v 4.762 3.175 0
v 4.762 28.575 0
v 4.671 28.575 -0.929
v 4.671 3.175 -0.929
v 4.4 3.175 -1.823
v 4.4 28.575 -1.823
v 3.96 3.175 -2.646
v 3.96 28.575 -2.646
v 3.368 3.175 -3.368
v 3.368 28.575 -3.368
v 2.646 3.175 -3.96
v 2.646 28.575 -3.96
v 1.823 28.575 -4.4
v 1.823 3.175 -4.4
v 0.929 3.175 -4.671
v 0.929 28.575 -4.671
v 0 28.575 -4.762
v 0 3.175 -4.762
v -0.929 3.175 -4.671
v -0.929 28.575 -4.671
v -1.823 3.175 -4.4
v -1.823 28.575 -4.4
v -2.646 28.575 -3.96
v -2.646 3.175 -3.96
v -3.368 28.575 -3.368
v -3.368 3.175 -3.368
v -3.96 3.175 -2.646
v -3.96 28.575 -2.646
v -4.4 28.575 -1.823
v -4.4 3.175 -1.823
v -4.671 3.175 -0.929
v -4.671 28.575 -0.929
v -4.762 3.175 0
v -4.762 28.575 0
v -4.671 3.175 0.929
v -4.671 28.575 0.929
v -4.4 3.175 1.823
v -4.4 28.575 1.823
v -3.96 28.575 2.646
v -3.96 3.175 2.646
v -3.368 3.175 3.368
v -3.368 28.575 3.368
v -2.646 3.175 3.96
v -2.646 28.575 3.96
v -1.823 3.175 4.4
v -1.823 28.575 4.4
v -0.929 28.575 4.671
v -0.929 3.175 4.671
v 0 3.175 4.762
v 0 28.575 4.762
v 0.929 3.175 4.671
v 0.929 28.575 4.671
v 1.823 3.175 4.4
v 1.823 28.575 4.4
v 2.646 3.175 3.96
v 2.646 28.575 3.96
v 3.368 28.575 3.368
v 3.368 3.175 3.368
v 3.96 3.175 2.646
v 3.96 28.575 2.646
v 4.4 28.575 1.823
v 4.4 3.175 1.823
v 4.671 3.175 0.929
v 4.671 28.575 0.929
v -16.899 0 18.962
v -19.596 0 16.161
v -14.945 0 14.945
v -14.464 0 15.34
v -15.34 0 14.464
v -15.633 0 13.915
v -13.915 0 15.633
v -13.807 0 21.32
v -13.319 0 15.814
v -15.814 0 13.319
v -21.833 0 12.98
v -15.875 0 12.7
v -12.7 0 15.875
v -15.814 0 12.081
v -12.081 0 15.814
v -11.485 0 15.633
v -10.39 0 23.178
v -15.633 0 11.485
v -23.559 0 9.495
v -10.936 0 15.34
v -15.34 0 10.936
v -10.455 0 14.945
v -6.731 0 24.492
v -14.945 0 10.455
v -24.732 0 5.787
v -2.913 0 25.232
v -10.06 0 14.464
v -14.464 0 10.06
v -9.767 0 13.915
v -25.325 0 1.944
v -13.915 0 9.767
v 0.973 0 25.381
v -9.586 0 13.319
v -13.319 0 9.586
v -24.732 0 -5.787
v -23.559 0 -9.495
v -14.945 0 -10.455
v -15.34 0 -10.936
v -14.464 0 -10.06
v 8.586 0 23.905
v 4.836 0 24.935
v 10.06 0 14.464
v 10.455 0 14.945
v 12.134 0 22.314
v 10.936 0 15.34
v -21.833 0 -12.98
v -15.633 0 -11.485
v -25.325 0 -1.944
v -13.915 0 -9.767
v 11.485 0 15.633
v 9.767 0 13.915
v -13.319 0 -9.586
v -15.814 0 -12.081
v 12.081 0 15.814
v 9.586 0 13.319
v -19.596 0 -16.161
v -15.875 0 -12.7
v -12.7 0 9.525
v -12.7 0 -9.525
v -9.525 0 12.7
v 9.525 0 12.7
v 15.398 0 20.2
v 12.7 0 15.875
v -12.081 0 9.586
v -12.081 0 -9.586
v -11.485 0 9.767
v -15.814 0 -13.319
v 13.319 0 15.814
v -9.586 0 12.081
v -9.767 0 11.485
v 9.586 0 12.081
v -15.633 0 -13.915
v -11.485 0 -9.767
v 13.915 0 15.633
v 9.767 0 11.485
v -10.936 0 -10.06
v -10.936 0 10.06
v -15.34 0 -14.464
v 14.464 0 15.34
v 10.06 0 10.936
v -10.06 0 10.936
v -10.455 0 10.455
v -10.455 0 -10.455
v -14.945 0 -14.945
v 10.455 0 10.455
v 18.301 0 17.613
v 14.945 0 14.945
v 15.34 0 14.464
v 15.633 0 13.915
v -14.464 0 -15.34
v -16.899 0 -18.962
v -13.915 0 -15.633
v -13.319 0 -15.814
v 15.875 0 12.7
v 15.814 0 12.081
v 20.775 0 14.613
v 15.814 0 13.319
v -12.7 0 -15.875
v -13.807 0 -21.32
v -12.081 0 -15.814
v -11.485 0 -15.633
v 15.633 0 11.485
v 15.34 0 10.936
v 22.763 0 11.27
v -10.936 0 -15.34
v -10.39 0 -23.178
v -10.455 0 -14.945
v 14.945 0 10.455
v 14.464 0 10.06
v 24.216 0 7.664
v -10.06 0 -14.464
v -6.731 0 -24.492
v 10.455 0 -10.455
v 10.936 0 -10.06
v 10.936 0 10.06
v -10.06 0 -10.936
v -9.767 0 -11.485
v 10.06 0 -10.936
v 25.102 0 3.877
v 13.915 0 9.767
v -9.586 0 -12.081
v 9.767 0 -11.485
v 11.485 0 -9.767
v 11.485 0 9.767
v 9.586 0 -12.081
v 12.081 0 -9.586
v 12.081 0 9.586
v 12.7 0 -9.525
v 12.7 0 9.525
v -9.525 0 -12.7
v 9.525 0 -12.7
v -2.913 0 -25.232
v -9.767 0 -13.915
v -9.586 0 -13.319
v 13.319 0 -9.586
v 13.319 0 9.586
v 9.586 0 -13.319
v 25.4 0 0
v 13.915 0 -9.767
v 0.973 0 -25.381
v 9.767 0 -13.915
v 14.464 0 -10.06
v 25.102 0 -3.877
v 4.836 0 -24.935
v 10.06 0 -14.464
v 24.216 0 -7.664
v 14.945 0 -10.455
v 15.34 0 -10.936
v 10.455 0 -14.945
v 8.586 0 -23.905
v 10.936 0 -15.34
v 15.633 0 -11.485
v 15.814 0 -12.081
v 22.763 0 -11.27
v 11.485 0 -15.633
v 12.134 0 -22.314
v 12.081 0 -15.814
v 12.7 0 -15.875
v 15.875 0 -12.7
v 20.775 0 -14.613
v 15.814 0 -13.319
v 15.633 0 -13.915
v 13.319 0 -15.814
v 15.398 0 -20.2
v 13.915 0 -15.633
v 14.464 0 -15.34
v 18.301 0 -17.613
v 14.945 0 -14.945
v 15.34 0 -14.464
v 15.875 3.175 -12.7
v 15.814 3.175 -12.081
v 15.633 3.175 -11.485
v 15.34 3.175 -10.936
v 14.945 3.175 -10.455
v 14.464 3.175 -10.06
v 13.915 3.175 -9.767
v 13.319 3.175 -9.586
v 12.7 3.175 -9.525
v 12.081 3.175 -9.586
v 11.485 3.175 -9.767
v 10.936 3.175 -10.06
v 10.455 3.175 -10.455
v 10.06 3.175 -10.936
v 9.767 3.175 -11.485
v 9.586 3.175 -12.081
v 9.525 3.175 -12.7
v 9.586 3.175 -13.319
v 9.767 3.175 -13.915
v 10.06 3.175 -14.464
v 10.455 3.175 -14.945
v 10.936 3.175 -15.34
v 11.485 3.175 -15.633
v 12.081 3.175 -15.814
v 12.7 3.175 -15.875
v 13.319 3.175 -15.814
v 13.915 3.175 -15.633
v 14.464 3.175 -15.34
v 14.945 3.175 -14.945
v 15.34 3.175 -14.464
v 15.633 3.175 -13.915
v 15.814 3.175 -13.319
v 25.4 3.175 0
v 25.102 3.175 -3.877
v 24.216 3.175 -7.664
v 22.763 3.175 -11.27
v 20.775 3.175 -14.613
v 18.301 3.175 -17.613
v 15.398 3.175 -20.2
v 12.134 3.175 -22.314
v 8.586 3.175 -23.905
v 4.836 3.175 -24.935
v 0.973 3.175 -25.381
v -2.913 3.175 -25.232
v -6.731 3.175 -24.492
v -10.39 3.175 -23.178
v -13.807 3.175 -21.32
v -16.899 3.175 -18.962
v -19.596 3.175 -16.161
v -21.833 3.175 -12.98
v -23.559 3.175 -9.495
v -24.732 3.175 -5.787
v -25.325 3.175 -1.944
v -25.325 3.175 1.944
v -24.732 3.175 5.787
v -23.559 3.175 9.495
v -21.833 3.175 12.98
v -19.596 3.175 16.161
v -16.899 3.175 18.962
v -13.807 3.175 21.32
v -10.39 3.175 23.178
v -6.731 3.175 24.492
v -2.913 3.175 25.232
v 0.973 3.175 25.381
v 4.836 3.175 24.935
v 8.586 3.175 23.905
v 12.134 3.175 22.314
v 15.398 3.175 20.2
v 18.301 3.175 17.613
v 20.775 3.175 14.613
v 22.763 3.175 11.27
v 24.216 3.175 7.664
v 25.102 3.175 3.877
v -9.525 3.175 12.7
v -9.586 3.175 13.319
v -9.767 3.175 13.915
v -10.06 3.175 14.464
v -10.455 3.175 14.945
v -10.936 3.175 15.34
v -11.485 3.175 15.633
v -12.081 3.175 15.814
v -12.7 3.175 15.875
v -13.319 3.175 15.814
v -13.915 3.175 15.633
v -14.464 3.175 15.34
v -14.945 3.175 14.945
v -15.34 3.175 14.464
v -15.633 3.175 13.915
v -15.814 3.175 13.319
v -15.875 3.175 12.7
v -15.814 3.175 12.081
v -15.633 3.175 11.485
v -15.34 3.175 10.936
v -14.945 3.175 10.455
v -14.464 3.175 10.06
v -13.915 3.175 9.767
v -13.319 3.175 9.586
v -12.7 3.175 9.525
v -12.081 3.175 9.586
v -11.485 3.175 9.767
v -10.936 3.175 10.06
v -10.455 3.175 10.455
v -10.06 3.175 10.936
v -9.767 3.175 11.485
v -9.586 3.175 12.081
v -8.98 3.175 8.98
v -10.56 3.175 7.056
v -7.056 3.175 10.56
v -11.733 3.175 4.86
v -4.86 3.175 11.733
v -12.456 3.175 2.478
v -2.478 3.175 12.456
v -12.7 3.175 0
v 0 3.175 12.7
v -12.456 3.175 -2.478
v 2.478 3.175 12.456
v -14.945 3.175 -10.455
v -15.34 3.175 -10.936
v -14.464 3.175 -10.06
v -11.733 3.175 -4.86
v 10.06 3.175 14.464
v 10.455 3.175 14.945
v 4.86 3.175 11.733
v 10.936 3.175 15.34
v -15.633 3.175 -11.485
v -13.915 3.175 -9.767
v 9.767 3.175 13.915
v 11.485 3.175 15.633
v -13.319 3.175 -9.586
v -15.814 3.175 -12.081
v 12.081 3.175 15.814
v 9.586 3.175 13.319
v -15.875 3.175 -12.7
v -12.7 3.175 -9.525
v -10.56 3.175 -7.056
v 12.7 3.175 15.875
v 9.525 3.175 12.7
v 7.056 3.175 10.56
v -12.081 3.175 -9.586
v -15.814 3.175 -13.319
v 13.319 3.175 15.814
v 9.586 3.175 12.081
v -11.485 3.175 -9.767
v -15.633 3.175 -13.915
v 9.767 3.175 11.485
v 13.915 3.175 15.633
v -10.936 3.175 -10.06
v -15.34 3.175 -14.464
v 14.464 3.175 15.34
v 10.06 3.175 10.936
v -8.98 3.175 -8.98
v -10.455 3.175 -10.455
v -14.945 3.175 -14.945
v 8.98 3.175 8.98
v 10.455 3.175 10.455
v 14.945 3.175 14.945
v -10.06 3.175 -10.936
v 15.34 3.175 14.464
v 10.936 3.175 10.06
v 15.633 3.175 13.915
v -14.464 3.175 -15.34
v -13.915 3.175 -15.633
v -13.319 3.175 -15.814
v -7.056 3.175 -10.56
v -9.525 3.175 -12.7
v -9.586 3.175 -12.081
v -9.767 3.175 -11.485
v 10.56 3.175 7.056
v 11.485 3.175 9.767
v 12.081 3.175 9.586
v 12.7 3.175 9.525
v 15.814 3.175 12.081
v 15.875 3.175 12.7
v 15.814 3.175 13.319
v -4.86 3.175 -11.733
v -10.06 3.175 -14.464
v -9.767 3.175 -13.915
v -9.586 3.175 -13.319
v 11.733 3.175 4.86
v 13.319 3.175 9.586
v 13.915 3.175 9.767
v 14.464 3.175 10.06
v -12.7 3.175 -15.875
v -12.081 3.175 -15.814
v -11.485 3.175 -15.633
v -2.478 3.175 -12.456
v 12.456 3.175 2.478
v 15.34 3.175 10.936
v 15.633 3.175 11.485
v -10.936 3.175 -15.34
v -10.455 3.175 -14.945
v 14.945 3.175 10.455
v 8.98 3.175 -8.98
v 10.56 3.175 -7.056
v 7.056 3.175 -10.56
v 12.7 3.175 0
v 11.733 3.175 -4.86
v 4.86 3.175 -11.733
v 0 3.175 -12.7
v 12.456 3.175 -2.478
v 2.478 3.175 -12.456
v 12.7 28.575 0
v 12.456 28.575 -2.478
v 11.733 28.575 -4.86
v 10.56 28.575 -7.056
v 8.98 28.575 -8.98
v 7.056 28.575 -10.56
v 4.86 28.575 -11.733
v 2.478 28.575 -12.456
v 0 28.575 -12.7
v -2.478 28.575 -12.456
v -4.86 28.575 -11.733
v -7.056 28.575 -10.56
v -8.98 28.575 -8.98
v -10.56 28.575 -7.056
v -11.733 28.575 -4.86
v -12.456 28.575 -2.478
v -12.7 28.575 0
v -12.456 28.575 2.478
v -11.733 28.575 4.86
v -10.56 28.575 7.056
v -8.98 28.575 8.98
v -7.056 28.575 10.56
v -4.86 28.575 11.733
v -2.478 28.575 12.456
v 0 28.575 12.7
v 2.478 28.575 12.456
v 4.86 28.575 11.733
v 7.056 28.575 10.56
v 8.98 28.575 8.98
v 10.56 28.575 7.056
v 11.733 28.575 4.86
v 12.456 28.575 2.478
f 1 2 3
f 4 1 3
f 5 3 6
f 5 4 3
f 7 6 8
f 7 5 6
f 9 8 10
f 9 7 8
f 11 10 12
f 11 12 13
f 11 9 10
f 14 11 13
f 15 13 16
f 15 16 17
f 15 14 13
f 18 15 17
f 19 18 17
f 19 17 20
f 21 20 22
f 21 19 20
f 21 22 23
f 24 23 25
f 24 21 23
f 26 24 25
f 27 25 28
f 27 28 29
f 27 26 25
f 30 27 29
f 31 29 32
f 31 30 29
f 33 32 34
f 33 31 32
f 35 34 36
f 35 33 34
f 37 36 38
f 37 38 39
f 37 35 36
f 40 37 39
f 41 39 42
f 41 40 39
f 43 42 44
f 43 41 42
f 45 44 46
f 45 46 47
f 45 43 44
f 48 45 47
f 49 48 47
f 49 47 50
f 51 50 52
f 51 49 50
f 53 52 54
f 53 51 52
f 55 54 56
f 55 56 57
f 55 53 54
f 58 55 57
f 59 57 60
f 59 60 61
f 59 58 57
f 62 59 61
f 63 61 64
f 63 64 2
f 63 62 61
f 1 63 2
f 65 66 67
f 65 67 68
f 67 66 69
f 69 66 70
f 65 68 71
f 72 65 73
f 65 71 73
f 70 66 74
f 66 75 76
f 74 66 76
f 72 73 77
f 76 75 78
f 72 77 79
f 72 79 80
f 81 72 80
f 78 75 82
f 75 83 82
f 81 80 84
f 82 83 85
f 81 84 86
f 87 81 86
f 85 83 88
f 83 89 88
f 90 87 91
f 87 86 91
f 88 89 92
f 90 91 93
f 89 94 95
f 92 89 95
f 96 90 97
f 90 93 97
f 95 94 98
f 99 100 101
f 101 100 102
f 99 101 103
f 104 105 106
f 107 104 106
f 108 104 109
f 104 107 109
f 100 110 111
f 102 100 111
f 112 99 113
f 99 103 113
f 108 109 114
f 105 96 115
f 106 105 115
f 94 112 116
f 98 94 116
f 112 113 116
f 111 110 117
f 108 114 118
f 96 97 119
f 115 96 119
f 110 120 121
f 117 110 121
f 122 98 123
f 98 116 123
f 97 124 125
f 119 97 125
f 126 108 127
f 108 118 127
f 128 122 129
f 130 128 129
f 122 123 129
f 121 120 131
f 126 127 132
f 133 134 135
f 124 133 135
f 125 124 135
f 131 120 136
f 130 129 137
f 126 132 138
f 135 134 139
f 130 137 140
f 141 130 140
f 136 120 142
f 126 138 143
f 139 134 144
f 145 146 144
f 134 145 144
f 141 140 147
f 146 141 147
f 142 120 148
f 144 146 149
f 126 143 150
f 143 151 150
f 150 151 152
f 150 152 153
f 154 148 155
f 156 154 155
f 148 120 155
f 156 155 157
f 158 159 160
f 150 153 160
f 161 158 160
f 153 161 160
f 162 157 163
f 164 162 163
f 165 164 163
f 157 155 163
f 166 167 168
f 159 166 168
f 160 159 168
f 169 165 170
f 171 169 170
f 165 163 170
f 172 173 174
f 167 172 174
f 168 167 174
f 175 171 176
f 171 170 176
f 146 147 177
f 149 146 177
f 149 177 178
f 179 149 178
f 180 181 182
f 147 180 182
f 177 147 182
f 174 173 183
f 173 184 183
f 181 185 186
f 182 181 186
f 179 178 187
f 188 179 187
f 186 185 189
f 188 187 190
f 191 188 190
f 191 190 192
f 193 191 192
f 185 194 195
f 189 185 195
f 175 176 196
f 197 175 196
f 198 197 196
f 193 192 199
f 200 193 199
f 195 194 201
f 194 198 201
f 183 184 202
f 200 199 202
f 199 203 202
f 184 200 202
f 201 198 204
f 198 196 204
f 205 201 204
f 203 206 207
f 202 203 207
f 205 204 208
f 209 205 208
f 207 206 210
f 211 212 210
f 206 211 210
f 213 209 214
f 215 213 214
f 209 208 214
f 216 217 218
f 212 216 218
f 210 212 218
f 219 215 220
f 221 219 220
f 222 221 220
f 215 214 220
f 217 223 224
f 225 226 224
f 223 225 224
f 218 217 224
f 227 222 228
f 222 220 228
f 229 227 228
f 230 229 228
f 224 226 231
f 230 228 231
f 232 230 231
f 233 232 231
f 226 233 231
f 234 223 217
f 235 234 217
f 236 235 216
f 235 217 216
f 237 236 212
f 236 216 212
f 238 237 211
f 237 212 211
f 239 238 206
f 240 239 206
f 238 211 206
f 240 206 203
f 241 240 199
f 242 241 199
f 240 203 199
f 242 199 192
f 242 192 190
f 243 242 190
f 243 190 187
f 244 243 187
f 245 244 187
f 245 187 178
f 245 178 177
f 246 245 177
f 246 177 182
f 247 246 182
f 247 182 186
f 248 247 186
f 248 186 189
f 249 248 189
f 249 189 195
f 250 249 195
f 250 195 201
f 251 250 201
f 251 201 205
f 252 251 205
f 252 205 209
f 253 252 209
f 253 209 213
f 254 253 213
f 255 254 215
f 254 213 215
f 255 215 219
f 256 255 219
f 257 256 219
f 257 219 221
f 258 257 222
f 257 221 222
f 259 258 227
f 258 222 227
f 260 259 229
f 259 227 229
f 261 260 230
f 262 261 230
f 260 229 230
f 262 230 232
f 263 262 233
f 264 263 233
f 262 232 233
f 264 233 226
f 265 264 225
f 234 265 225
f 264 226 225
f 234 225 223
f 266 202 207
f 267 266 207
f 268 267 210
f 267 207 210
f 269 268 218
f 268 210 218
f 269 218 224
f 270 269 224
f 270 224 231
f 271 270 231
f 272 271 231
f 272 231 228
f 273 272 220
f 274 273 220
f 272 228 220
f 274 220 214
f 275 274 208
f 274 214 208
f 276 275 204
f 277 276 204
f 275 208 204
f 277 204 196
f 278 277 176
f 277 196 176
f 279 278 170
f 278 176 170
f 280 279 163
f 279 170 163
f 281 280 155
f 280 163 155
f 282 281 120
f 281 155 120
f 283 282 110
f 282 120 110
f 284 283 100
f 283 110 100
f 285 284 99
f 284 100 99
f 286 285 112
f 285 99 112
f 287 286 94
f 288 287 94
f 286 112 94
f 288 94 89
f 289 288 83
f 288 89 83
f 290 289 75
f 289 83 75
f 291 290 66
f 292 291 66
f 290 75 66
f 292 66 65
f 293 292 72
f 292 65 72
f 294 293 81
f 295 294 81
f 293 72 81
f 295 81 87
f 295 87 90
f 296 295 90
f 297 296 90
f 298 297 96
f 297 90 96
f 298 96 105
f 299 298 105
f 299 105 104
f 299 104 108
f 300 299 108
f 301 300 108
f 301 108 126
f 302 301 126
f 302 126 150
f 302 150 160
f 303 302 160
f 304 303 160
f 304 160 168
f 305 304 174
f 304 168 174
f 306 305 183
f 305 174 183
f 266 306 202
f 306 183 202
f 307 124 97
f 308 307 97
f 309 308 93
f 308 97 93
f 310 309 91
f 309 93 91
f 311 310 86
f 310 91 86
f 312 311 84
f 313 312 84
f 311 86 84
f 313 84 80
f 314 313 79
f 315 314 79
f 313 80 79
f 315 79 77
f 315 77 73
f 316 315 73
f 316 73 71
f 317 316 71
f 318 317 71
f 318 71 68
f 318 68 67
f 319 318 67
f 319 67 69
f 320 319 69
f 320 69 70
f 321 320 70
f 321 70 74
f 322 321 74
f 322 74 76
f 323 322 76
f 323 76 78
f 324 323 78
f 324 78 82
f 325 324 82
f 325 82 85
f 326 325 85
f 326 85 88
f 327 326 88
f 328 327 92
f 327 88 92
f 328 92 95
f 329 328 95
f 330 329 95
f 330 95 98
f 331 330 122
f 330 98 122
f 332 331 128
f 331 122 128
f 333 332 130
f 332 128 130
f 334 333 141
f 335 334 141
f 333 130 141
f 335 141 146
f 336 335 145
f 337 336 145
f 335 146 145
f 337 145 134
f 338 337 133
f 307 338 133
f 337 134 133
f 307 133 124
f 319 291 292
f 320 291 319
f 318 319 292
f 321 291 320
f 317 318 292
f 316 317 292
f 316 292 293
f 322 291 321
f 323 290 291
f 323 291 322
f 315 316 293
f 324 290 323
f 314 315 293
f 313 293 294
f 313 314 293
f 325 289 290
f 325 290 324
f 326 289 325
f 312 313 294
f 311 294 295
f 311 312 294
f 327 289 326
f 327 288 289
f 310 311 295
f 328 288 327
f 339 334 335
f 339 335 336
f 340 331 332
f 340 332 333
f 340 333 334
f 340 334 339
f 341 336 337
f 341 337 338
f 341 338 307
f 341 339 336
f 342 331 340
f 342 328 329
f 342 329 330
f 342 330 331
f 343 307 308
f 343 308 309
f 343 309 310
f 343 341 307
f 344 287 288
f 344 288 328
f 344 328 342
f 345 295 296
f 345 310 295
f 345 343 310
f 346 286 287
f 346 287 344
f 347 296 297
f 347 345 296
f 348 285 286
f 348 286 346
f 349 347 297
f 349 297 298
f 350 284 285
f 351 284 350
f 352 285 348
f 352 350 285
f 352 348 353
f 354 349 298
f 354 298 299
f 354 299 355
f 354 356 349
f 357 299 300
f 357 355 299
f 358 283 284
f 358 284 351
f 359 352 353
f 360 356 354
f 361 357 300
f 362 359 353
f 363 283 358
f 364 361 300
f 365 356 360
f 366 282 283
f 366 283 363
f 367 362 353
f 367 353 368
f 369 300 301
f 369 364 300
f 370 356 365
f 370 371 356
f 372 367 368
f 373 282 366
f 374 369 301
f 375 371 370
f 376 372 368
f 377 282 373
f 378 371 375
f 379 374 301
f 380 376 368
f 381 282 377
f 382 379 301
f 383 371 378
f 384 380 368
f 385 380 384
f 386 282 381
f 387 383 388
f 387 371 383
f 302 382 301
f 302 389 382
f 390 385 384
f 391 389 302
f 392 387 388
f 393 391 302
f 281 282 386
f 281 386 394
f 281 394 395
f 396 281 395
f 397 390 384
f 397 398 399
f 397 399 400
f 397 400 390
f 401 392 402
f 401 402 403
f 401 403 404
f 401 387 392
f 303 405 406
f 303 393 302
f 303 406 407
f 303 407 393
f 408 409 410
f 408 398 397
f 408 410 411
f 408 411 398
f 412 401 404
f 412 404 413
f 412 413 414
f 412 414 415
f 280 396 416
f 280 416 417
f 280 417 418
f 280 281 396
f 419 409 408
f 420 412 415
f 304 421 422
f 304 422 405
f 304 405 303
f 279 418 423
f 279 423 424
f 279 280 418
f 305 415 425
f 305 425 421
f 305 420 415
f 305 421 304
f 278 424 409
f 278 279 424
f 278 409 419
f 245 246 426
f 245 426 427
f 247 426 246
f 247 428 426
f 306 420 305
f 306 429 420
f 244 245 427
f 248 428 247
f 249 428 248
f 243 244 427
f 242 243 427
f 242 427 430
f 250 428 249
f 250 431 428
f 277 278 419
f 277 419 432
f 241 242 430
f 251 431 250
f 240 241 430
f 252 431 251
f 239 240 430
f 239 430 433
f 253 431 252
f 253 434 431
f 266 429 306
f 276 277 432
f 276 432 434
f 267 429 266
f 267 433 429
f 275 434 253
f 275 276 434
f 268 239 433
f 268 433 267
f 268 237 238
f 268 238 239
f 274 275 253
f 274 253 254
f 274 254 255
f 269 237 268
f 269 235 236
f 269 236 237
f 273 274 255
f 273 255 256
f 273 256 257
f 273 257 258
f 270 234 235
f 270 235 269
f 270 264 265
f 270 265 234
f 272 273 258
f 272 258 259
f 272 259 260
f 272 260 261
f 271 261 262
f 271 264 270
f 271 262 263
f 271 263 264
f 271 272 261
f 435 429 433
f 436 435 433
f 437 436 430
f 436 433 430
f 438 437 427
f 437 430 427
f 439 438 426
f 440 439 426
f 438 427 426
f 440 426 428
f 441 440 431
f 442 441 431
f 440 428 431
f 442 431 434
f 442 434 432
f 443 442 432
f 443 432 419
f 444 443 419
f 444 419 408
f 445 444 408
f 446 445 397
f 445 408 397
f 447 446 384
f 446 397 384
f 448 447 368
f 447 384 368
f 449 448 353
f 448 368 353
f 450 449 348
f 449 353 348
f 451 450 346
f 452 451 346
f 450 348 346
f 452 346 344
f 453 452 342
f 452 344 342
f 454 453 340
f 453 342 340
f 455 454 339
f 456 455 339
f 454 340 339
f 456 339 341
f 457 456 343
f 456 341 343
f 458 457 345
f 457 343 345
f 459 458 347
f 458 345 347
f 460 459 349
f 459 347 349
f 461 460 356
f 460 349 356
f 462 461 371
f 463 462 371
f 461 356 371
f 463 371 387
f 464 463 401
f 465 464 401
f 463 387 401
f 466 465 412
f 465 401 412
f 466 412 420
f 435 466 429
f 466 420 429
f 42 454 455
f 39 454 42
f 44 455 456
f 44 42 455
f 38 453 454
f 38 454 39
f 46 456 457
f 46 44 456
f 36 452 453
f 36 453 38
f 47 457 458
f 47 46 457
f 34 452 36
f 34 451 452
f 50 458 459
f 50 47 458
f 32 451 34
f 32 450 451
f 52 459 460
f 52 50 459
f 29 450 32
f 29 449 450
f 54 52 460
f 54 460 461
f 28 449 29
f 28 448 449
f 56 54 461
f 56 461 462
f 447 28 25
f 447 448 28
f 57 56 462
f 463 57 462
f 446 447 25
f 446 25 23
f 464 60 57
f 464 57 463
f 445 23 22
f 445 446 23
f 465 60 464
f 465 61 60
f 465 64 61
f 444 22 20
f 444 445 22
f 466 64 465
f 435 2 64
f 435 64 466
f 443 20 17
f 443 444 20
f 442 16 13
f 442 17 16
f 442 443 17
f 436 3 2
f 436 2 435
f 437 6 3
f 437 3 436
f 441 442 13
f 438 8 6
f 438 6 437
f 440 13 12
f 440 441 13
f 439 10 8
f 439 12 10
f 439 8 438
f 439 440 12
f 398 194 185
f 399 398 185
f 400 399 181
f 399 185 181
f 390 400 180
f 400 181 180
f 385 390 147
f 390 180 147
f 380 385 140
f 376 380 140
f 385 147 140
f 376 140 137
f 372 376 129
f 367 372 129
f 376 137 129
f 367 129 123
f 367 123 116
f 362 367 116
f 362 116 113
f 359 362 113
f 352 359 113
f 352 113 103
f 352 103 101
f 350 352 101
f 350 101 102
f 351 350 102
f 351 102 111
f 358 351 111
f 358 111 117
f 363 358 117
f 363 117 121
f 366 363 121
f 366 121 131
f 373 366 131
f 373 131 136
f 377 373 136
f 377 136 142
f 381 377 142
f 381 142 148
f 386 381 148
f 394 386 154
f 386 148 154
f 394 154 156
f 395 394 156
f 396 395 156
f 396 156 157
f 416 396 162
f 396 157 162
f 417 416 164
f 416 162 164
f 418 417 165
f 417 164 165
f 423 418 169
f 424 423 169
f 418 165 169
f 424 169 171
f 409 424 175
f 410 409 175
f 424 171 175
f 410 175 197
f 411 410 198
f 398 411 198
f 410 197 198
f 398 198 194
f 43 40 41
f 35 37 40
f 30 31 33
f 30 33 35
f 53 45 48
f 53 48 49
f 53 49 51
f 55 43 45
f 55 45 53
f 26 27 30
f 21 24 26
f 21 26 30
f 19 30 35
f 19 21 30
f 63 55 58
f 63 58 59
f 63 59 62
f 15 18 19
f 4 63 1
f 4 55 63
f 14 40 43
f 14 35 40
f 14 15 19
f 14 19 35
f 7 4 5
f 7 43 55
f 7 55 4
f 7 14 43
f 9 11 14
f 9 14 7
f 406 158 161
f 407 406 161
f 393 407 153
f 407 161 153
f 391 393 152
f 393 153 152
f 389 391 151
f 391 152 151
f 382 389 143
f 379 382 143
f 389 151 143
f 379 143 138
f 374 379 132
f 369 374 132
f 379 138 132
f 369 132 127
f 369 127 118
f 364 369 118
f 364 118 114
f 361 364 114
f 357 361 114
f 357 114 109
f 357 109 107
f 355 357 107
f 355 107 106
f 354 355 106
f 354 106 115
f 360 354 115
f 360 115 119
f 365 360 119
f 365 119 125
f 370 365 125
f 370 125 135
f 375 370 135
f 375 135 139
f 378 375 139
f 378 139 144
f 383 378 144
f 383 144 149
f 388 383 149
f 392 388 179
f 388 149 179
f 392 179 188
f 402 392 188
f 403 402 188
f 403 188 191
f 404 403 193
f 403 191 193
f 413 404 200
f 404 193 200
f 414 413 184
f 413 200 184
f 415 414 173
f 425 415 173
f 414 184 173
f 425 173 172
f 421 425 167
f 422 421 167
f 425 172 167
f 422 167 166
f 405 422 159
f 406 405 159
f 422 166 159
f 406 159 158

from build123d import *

# Parameters (mm, degrees)
SKETCH1_R           = 25.4
BOSS_EXTRUDE1_DEPTH = 3.175
SKETCH2_R           = 12.7
SKETCH2_R_2         = 4.7625
BOSS_EXTRUDE2_DEPTH = 25.4
SKETCH3_R           = 3.175
CUT_EXTRUDE1_DEPTH  = 29.575


with BuildPart() as part:
    # Sketch1 → Boss-Extrude1 (new body)
    with BuildSketch(Plane(origin=(0, 0, 0), x_dir=(1, 0, 0), z_dir=(0, 1, 0))):
        Circle(SKETCH1_R)
    extrude(amount=BOSS_EXTRUDE1_DEPTH)

    # Sketch2 → Boss-Extrude2 (add)
    with BuildSketch(Plane(origin=(0, 3.175, 0), x_dir=(1, 0, 0), z_dir=(0, 1, 0))):
        Circle(SKETCH2_R)
        Circle(SKETCH2_R_2, mode=Mode.SUBTRACT)
    extrude(amount=BOSS_EXTRUDE2_DEPTH)

    # Sketch3 → Cut-Extrude1 (cut, through all)
    with BuildSketch(Plane.XZ):
        with Locations((-12.7, 12.7)):
            Circle(SKETCH3_R)
        with Locations((12.7, 12.7)):
            Circle(SKETCH3_R)
        with Locations((12.7, -12.7)):
            Circle(SKETCH3_R)
        with Locations((-12.7, -12.7)):
            Circle(SKETCH3_R)
    extrude(amount=-CUT_EXTRUDE1_DEPTH, mode=Mode.SUBTRACT)


solid = part.part
